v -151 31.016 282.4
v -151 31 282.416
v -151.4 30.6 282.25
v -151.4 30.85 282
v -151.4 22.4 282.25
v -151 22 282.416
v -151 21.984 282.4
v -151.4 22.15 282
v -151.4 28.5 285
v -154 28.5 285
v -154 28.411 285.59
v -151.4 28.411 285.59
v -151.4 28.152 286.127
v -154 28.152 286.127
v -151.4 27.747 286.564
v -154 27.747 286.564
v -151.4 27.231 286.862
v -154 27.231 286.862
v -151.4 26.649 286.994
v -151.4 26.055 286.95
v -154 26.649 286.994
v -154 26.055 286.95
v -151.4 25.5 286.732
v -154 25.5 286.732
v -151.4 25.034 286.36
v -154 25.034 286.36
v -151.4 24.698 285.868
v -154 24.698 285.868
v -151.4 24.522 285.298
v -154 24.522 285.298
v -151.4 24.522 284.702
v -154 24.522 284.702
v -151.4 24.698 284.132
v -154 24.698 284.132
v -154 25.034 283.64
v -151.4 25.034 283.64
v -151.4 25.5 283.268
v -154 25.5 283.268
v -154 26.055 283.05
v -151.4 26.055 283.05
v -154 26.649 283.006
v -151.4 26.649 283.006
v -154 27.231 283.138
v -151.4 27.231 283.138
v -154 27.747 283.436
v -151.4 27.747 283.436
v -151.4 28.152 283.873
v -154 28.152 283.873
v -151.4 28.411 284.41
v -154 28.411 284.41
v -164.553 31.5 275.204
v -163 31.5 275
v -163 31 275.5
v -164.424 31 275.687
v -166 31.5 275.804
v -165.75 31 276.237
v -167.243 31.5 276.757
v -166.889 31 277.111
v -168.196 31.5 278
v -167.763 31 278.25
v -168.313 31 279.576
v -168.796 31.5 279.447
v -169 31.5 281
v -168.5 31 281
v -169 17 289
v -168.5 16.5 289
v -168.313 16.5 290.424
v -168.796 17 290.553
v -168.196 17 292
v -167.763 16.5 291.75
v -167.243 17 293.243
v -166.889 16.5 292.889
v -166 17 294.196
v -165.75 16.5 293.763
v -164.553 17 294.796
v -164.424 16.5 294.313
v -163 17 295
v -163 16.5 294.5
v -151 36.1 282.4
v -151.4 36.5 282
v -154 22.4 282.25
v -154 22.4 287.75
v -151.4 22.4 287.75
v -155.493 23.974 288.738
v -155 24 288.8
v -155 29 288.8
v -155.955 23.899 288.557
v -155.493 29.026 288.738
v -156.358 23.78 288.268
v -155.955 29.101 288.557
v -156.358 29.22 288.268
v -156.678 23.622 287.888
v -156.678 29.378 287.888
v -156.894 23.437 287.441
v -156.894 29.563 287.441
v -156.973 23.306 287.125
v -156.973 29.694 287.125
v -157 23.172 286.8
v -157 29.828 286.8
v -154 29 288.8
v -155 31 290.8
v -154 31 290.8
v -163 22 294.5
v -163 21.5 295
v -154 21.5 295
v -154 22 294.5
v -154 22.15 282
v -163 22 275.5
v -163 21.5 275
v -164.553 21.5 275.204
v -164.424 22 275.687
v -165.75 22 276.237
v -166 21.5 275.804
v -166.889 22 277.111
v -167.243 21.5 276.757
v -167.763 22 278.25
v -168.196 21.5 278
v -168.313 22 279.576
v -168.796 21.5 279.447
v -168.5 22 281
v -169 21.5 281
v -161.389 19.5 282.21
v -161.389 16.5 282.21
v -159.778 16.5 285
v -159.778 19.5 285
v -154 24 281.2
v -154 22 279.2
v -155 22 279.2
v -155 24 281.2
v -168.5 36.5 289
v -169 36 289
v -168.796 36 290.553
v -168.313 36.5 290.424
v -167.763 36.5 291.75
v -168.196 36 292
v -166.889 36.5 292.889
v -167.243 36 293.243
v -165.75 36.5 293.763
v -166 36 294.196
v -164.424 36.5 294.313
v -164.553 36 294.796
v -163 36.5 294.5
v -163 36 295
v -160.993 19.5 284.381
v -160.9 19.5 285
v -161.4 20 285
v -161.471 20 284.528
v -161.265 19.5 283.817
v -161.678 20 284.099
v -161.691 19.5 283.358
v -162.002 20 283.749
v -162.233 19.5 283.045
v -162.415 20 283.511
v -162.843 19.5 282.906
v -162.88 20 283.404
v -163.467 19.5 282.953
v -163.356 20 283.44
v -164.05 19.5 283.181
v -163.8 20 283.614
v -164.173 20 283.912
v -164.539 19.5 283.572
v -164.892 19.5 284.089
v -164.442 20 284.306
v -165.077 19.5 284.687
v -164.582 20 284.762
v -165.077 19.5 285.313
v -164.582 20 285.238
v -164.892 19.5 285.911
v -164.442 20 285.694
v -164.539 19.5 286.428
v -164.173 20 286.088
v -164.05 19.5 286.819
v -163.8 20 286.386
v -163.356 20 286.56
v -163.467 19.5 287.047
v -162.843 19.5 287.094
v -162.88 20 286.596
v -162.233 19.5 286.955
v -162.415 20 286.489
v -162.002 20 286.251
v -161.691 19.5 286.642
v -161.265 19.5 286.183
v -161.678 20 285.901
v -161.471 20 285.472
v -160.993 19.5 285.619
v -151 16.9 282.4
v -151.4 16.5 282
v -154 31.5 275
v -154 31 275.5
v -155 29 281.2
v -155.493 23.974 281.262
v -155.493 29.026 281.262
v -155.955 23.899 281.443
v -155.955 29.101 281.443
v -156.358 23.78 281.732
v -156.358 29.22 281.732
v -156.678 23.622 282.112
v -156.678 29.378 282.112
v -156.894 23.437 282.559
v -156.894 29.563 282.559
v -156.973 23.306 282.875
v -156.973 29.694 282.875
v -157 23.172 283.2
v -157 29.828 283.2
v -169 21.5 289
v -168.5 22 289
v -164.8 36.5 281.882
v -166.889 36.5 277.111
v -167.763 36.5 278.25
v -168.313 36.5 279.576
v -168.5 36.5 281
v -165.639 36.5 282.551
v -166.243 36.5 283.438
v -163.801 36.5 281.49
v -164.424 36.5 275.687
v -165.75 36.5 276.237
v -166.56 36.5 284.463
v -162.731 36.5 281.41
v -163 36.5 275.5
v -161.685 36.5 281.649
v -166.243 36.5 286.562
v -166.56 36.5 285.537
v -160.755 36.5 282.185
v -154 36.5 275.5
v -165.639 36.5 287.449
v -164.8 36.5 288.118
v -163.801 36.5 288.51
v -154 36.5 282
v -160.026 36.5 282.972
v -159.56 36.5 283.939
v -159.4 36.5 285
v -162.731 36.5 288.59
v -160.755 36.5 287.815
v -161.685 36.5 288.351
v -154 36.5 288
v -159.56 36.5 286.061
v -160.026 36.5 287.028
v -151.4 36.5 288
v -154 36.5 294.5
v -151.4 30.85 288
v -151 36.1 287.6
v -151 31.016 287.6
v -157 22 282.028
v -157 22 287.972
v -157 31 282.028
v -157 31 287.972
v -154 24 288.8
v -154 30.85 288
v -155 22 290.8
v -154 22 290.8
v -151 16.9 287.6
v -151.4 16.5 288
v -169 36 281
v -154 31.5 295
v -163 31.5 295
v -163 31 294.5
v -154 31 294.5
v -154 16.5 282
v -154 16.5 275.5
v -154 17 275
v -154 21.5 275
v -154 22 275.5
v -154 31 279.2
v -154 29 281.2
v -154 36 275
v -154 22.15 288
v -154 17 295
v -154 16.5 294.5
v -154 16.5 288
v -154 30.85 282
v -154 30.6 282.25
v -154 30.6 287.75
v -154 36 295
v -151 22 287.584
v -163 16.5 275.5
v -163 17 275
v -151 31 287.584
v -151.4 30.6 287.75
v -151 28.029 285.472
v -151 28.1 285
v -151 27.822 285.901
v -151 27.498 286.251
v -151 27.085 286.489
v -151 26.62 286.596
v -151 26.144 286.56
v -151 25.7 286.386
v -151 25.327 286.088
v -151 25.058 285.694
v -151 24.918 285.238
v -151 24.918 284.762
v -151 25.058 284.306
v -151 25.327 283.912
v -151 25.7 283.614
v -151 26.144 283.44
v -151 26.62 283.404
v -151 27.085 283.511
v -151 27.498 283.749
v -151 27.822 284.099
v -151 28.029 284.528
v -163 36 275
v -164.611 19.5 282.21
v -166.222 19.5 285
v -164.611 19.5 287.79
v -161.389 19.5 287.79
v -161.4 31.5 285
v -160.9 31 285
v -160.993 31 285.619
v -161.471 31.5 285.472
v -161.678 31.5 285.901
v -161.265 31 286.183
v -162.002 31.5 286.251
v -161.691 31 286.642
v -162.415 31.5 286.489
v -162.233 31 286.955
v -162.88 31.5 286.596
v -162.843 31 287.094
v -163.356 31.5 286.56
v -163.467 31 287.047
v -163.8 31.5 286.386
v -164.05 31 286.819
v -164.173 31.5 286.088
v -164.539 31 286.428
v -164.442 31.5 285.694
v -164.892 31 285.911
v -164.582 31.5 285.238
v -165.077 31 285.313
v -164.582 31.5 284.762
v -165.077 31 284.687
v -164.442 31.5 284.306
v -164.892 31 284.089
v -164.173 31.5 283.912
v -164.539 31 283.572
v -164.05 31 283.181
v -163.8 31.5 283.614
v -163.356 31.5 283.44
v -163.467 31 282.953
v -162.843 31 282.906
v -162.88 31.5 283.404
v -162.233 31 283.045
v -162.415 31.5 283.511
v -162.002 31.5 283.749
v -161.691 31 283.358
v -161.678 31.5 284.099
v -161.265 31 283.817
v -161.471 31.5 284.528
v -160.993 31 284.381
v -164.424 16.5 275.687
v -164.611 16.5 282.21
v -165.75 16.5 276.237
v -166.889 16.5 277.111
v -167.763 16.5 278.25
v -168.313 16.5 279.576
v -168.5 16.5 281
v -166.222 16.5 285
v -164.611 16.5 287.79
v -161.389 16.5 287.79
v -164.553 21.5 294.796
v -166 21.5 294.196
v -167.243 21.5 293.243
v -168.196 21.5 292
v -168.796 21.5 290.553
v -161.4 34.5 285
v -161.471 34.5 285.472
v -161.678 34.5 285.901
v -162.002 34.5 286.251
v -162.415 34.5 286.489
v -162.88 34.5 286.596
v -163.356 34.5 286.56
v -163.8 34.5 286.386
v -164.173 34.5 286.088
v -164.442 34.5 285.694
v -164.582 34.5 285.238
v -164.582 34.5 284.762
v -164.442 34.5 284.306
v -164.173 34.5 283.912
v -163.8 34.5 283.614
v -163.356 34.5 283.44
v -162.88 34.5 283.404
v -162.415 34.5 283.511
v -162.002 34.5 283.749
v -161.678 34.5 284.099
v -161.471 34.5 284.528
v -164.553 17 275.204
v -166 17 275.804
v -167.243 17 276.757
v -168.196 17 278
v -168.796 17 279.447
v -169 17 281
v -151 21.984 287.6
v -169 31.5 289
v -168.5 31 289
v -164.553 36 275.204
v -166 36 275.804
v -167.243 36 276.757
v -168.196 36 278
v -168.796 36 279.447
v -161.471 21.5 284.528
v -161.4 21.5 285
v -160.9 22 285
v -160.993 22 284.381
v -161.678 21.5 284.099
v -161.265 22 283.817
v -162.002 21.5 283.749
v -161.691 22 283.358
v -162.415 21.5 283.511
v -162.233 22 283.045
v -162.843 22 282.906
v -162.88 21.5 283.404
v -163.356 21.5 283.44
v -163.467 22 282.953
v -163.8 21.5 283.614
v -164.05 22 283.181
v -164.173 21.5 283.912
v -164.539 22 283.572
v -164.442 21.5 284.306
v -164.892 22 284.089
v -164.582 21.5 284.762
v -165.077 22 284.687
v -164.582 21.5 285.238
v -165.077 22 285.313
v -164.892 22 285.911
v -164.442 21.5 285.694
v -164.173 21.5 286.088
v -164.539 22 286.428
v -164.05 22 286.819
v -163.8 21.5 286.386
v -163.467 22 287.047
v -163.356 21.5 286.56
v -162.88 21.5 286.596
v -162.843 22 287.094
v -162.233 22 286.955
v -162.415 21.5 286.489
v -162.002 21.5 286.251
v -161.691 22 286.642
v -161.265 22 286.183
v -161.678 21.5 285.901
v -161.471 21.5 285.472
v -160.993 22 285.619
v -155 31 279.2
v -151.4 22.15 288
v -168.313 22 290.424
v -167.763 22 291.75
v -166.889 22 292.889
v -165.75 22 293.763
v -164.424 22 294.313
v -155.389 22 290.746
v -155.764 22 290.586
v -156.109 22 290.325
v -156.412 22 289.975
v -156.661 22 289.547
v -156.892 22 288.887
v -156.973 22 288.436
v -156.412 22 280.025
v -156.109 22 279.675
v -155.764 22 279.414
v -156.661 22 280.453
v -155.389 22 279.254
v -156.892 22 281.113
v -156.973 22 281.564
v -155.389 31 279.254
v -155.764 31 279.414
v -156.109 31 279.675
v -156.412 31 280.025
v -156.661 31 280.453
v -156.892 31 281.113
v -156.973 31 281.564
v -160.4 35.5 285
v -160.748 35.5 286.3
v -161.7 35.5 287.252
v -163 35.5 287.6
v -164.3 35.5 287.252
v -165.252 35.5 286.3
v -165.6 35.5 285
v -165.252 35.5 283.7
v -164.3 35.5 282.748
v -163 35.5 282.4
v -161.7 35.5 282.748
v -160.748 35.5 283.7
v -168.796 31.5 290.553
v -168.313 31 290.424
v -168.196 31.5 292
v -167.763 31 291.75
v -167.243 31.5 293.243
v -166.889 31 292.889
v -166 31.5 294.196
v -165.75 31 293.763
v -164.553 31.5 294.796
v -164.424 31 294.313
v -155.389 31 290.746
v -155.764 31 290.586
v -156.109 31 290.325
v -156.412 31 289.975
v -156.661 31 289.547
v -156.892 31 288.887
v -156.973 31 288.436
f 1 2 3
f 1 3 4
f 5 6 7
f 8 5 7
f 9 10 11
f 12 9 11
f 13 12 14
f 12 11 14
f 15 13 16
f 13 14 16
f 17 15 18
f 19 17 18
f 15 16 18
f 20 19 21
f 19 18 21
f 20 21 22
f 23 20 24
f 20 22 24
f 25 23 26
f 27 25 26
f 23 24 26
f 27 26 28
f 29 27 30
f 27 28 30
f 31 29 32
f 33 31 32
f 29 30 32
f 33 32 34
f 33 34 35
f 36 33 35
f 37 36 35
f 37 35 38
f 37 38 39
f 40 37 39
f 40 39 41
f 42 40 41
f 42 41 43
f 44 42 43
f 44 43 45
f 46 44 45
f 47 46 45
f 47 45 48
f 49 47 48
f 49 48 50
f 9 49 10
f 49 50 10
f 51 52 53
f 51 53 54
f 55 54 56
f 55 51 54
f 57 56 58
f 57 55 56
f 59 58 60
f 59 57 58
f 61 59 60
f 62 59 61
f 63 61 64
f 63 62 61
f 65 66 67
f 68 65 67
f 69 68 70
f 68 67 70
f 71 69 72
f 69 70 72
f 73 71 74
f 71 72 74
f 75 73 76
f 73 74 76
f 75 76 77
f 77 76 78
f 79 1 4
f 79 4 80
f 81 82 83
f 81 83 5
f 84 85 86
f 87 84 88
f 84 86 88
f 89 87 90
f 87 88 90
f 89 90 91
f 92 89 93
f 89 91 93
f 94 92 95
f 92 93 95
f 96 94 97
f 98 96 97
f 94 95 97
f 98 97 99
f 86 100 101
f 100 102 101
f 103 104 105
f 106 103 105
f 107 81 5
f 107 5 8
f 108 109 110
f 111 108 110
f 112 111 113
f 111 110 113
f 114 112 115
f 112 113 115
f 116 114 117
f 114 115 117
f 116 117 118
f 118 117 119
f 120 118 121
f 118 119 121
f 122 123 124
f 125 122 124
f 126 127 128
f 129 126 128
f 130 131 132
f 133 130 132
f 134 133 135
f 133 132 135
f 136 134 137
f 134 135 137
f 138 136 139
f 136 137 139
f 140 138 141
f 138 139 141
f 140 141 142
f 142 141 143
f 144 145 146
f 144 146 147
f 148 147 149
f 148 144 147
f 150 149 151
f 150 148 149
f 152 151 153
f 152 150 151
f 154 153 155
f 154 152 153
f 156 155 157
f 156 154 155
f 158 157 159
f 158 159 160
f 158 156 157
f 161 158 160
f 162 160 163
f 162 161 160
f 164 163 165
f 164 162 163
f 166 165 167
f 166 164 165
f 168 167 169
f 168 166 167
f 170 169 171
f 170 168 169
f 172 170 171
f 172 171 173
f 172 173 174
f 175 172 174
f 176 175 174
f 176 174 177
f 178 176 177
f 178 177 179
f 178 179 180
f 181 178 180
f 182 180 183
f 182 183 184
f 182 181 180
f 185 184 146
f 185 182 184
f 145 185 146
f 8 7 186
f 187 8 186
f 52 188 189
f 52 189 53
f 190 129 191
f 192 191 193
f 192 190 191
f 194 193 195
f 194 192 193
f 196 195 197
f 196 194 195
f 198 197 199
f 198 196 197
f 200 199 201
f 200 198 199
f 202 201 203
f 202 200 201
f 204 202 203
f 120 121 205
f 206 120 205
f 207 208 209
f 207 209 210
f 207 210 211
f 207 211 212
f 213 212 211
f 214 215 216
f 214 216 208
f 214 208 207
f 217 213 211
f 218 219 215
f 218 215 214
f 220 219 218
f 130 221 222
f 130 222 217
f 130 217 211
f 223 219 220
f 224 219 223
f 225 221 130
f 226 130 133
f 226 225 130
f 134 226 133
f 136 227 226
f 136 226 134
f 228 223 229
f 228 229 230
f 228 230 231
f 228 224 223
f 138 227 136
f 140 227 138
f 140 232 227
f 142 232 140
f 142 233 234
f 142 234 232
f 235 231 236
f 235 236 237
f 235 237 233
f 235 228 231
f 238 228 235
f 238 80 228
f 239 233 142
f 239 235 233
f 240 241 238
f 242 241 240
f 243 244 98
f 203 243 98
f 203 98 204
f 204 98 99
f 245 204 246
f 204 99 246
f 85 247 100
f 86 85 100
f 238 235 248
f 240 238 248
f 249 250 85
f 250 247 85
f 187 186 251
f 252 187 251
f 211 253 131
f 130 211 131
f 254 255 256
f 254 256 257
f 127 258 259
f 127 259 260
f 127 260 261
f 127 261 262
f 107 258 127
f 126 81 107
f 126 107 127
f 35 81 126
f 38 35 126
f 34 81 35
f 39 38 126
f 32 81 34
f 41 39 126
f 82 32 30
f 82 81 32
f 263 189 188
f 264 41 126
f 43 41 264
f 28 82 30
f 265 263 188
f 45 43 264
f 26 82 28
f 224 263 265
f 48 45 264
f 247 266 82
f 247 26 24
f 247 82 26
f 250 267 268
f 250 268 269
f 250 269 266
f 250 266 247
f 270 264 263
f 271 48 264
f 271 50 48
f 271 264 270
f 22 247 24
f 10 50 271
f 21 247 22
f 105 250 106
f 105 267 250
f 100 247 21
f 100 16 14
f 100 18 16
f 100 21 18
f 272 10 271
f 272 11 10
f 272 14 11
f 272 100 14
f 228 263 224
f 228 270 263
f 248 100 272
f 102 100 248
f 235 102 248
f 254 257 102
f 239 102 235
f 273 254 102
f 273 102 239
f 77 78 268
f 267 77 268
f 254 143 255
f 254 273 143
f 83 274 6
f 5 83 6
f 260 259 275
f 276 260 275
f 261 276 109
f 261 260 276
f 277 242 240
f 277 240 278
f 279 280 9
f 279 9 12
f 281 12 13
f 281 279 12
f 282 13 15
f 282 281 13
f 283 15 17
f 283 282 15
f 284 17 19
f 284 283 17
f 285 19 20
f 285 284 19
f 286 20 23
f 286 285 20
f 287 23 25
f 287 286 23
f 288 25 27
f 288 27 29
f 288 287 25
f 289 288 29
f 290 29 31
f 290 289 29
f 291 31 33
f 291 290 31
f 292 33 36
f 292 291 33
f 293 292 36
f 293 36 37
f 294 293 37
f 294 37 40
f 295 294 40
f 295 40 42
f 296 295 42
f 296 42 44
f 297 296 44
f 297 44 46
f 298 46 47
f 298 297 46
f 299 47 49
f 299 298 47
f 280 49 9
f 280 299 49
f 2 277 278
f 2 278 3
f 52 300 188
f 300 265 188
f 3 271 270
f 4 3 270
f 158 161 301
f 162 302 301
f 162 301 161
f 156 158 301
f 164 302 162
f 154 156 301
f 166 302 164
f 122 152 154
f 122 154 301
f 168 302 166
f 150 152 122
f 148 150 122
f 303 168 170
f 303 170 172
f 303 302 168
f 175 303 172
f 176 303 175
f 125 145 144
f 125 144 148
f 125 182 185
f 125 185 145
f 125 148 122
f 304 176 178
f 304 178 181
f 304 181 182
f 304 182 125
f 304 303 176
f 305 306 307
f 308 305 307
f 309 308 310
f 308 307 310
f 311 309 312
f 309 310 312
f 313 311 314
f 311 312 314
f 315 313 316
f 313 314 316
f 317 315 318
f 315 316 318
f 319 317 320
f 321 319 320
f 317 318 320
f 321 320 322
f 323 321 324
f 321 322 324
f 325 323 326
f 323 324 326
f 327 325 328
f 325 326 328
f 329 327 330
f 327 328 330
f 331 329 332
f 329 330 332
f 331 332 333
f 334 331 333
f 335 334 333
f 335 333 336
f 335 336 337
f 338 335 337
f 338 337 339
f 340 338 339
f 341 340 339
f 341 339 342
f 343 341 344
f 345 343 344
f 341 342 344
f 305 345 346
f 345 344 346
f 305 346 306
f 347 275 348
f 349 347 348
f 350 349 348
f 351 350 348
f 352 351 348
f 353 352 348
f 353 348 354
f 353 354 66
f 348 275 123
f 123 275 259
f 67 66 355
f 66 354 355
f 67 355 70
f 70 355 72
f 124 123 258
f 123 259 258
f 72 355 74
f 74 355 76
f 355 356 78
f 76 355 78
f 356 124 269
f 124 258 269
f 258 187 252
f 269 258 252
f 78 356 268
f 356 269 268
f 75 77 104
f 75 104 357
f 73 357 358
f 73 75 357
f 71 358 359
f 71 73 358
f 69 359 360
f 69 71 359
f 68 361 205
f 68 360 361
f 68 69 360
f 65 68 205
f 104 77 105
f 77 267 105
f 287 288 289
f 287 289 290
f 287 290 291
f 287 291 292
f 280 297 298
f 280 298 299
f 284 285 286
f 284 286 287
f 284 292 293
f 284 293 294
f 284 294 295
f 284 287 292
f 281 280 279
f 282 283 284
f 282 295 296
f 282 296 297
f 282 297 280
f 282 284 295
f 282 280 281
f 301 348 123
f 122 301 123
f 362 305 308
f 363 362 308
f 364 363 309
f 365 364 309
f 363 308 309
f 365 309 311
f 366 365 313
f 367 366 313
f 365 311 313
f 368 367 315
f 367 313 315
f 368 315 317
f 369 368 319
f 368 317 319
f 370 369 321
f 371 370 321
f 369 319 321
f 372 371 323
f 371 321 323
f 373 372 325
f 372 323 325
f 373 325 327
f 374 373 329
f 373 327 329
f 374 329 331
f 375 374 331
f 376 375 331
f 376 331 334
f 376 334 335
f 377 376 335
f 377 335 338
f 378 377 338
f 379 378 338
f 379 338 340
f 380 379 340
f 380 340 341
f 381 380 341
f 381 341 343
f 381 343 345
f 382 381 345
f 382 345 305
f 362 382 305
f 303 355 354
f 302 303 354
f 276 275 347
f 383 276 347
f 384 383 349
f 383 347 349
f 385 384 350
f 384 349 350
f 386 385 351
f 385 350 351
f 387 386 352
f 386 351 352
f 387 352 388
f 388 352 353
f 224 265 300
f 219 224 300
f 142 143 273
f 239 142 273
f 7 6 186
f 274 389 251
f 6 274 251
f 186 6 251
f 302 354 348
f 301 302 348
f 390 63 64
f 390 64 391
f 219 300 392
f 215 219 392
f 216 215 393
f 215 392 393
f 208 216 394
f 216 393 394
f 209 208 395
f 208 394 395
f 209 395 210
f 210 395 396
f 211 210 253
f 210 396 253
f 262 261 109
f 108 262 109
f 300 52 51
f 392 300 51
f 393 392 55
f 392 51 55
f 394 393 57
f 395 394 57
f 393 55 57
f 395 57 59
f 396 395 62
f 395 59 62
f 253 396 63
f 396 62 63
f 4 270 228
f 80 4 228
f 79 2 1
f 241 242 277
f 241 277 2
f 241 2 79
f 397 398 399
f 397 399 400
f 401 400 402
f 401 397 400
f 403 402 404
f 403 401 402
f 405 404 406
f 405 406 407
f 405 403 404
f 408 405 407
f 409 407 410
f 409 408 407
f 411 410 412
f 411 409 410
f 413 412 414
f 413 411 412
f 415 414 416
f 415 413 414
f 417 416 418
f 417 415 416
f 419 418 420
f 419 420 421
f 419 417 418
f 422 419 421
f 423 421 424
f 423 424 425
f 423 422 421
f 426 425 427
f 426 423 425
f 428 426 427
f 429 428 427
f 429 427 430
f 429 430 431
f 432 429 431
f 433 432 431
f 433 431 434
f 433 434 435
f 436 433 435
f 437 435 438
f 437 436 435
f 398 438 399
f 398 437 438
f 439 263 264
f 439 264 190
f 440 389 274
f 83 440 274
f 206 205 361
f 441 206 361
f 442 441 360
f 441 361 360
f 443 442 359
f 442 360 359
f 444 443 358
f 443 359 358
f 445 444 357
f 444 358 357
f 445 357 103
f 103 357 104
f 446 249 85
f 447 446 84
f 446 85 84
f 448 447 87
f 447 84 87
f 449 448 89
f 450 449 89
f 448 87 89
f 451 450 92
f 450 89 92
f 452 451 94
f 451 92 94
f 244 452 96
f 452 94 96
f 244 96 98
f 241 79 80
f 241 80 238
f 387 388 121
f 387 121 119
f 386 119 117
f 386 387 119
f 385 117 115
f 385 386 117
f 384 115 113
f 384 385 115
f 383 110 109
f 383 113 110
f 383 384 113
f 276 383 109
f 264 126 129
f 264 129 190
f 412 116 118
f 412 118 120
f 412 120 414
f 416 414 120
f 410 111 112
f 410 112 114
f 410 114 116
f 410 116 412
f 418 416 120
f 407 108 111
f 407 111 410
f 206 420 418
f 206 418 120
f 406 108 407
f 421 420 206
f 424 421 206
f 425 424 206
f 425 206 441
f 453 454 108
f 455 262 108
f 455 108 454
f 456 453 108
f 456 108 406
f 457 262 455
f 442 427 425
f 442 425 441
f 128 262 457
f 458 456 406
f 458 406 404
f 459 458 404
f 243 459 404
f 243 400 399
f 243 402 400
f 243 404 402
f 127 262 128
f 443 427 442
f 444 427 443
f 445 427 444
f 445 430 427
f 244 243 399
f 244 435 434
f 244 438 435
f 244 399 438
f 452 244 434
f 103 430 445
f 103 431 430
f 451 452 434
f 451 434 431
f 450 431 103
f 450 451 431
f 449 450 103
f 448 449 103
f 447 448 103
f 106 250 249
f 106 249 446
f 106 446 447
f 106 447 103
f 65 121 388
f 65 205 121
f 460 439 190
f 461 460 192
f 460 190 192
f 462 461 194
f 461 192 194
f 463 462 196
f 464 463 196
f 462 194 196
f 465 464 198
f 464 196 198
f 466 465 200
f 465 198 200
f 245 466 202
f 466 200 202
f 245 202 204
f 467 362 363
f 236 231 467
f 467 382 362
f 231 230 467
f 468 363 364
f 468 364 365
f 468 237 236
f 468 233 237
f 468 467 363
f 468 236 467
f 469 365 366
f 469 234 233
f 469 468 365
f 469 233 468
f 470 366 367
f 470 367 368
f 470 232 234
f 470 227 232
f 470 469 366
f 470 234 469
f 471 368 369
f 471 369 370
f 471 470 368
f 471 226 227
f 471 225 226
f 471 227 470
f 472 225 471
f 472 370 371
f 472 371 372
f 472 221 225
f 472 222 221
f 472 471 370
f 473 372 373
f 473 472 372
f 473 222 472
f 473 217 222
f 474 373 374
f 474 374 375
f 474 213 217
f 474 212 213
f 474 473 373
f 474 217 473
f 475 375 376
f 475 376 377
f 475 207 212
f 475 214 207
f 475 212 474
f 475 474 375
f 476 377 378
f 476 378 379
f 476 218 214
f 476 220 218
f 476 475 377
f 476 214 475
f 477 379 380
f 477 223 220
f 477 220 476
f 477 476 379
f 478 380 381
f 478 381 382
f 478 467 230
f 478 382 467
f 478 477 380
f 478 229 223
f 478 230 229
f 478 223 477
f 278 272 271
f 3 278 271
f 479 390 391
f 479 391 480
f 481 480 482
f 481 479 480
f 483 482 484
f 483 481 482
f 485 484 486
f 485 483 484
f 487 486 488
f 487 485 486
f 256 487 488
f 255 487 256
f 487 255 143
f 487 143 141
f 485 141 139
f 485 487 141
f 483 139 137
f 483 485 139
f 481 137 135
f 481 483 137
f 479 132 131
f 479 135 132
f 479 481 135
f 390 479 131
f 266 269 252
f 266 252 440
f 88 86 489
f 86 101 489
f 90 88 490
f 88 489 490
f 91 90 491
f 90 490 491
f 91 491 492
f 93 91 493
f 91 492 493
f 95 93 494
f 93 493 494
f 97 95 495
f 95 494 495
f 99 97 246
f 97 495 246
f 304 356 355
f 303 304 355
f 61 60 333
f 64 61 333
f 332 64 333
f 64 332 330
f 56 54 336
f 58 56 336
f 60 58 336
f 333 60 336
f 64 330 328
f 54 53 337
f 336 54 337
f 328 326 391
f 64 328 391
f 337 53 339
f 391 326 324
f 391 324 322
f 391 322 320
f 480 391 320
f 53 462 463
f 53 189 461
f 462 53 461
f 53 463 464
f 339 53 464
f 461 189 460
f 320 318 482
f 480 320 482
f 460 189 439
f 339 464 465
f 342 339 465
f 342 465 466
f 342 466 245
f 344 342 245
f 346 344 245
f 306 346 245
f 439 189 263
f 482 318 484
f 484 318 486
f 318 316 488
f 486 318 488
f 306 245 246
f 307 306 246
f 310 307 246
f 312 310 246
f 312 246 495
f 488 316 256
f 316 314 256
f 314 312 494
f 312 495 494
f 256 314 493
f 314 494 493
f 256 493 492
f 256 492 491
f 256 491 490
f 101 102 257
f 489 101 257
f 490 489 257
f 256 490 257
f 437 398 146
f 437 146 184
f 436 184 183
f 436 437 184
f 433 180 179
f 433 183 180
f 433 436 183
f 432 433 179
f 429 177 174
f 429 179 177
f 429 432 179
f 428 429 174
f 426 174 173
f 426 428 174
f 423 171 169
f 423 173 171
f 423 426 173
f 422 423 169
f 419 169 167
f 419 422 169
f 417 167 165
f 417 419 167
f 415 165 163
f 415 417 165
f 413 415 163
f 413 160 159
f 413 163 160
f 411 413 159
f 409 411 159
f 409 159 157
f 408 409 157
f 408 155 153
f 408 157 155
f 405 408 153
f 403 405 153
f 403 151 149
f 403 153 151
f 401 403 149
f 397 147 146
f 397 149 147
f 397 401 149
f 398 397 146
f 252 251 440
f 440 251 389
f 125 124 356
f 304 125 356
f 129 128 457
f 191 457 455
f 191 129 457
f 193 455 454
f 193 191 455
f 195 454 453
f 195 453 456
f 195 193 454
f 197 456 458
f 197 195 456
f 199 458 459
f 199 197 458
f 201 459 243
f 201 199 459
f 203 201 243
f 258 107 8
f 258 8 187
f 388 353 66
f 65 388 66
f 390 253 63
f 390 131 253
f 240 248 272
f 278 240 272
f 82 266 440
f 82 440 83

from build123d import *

# Parameters (mm, degrees)
SKETCH059_W          = 20
SKETCH059_H          = 20
PAD020_DEPTH         = 3
SKETCH060_W          = 9
SKETCH060_H          = 6.2
POCKET042_DEPTH      = 3.001
CHAMFER019_SIZE      = 2
PAD021_DEPTH         = 3
SKETCH062_R          = 2
PAD022_DEPTH         = 3
CHAMFER020_SIZE      = 0.4
SKETCH063_W          = 5.5
SKETCH063_H          = 20
PAD023_DEPTH         = 12
FILLET012_R          = 6
FILLET013_R          = 2
SKETCH064_R          = 1.6
POCKET043_DEPTH      = 10.001
POCKET043_DEPTH_BACK = 10.001
CHAMFER021_SIZE      = 2
POCKET044_DEPTH      = 3
CHAMFER022_SIZE      = 0.5


with BuildPart() as part:
    # Sketch059 → Pad020 (new body)
    with BuildSketch(Plane.YZ):
        Rectangle(SKETCH059_W, SKETCH059_H)
    extrude(amount=-PAD020_DEPTH)

    # Sketch060 (on Face5 of Pad020) → Pocket042 (cut, through all)
    with BuildSketch(Plane.YZ):
        with Locations((0, -6.9)):
            Rectangle(SKETCH060_W, SKETCH060_H)
        with Locations((0, 6.9)):
            Rectangle(SKETCH060_W, SKETCH060_H)
    extrude(amount=-POCKET042_DEPTH, mode=Mode.SUBTRACT)

    # Chamfer019
    chamfer019_edges = [part.edges().sort_by_distance(p)[0] for p in [
        (-1.5, 4.5, -3.8),
        (-1.5, -4.5, -3.8),
        (-1.5, -4.5, 3.8),
        (-1.5, 4.5, 3.8),
    ]]
    chamfer(chamfer019_edges, length=CHAMFER019_SIZE)

    # Sketch061 (on Face1 of Chamfer019) → Pad021 (join)
    with BuildSketch(Plane.YZ):
        Polygon((-10, 3), (-4.35, 3), (-4.1, 2.75), (-4.1, -2.75), (-4.35, -3), (-10, -3), align=None)
    pad021 = extrude(amount=PAD021_DEPTH)

    # Mirrored001: Pad021 across Sketch061 V_Axis
    add(pad021.mirror(Plane(origin=(0, 0, 0), x_dir=(1, 0, 0), z_dir=(0, 1, 0))))

    # Sketch062 (on Face1 of Mirrored001) → Pad022 (join)
    with BuildSketch(Plane.YZ):
        Circle(SKETCH062_R)
    extrude(amount=PAD022_DEPTH)

    # Chamfer020
    chamfer020_edges = [part.edges().sort_by_distance(p)[0] for p in [
        (3, -2, 0),
        (3, -7.175, 3),
        (3, -4.225, 2.875),
        (3, -4.1, 0),
        (3, -4.225, -2.875),
        (3, -7.175, -3),
        (3, -10, 0),
        (3, 7.175, 3),
        (3, 4.225, 2.875),
        (3, 4.1, 0),
        (3, 4.225, -2.875),
        (3, 7.175, -3),
        (3, 10, 0),
    ]]
    chamfer(chamfer020_edges, length=CHAMFER020_SIZE)

    # Sketch063 (on Face7 of Chamfer020) → Pad023 (join)
    with BuildSketch(Plane(origin=(-3, 0, 0), x_dir=(0, -1, 0), z_dir=(-1, 0, 0))):
        with Locations((-7.25, 0)):
            Rectangle(SKETCH063_W, SKETCH063_H)
        with Locations((7.25, 0)):
            Rectangle(SKETCH063_W, SKETCH063_H)
    extrude(amount=PAD023_DEPTH)

    # Fillet012
    fillet012_edges = [part.edges().sort_by_distance(p)[0] for p in [
        (-15, 7.25, -10),
        (-15, -7.25, -10),
        (-15, -7.25, 10),
        (-15, 7.25, 10),
    ]]
    fillet(fillet012_edges, radius=FILLET012_R)

    # Fillet013
    fillet013_edges = [part.edges().sort_by_distance(p)[0] for p in [
        (-3, 0, 3.8),
        (-3, 0, -3.8),
        (-3, 3.5, 4.8),
        (-3, -3.5, 4.8),
        (-3, -3.5, -4.8),
        (-3, 3.5, -4.8),
    ]]
    fillet(fillet013_edges, radius=FILLET013_R)

    # Sketch064 → Pocket043 (cut, two sides)
    with BuildSketch(Plane.XZ) as pocket043_sk:
        with Locations((-9, 0)):
            Circle(SKETCH064_R)
    extrude(amount=-POCKET043_DEPTH, mode=Mode.SUBTRACT)
    extrude(pocket043_sk.sketch, amount=POCKET043_DEPTH_BACK, mode=Mode.SUBTRACT)

    # Chamfer021
    chamfer021_edges = [part.edges().sort_by_distance(p)[0] for p in [
        (-10.6, 10, 0),
    ]]
    chamfer(chamfer021_edges, length=CHAMFER021_SIZE)

    # Sketch065 (on Face26 of Chamfer021) → Pocket044 (cut)
    with BuildSketch(Plane.XZ.offset(10)):
        Polygon((-5.778385, 0), (-7.389193, 2.79), (-10.610807, 2.79), (-12.221615, 0), (-10.610807, -2.79), (-7.389193, -2.79), align=None)
    extrude(amount=-POCKET044_DEPTH, mode=Mode.SUBTRACT)

    # Chamfer022
    chamfer022_edges = [part.edges().sort_by_distance(p)[0] for p in [
        (-4.5, -10, 10),
        (-4.5, 10, 10),
        (-4.5, -4.5, 10),
        (-4.5, 4.5, 10),
        (-10.6, 4.5, 0),
        (-10.6, -4.5, 0),
        (-10.6, -7, 0),
    ]]
    chamfer(chamfer022_edges, length=CHAMFER022_SIZE)


with BuildPart() as part_1:
    # Body012 placement: moved
    add(part.part.moved(Location((-154, 26.5, 285))))


solid = part_1.part
